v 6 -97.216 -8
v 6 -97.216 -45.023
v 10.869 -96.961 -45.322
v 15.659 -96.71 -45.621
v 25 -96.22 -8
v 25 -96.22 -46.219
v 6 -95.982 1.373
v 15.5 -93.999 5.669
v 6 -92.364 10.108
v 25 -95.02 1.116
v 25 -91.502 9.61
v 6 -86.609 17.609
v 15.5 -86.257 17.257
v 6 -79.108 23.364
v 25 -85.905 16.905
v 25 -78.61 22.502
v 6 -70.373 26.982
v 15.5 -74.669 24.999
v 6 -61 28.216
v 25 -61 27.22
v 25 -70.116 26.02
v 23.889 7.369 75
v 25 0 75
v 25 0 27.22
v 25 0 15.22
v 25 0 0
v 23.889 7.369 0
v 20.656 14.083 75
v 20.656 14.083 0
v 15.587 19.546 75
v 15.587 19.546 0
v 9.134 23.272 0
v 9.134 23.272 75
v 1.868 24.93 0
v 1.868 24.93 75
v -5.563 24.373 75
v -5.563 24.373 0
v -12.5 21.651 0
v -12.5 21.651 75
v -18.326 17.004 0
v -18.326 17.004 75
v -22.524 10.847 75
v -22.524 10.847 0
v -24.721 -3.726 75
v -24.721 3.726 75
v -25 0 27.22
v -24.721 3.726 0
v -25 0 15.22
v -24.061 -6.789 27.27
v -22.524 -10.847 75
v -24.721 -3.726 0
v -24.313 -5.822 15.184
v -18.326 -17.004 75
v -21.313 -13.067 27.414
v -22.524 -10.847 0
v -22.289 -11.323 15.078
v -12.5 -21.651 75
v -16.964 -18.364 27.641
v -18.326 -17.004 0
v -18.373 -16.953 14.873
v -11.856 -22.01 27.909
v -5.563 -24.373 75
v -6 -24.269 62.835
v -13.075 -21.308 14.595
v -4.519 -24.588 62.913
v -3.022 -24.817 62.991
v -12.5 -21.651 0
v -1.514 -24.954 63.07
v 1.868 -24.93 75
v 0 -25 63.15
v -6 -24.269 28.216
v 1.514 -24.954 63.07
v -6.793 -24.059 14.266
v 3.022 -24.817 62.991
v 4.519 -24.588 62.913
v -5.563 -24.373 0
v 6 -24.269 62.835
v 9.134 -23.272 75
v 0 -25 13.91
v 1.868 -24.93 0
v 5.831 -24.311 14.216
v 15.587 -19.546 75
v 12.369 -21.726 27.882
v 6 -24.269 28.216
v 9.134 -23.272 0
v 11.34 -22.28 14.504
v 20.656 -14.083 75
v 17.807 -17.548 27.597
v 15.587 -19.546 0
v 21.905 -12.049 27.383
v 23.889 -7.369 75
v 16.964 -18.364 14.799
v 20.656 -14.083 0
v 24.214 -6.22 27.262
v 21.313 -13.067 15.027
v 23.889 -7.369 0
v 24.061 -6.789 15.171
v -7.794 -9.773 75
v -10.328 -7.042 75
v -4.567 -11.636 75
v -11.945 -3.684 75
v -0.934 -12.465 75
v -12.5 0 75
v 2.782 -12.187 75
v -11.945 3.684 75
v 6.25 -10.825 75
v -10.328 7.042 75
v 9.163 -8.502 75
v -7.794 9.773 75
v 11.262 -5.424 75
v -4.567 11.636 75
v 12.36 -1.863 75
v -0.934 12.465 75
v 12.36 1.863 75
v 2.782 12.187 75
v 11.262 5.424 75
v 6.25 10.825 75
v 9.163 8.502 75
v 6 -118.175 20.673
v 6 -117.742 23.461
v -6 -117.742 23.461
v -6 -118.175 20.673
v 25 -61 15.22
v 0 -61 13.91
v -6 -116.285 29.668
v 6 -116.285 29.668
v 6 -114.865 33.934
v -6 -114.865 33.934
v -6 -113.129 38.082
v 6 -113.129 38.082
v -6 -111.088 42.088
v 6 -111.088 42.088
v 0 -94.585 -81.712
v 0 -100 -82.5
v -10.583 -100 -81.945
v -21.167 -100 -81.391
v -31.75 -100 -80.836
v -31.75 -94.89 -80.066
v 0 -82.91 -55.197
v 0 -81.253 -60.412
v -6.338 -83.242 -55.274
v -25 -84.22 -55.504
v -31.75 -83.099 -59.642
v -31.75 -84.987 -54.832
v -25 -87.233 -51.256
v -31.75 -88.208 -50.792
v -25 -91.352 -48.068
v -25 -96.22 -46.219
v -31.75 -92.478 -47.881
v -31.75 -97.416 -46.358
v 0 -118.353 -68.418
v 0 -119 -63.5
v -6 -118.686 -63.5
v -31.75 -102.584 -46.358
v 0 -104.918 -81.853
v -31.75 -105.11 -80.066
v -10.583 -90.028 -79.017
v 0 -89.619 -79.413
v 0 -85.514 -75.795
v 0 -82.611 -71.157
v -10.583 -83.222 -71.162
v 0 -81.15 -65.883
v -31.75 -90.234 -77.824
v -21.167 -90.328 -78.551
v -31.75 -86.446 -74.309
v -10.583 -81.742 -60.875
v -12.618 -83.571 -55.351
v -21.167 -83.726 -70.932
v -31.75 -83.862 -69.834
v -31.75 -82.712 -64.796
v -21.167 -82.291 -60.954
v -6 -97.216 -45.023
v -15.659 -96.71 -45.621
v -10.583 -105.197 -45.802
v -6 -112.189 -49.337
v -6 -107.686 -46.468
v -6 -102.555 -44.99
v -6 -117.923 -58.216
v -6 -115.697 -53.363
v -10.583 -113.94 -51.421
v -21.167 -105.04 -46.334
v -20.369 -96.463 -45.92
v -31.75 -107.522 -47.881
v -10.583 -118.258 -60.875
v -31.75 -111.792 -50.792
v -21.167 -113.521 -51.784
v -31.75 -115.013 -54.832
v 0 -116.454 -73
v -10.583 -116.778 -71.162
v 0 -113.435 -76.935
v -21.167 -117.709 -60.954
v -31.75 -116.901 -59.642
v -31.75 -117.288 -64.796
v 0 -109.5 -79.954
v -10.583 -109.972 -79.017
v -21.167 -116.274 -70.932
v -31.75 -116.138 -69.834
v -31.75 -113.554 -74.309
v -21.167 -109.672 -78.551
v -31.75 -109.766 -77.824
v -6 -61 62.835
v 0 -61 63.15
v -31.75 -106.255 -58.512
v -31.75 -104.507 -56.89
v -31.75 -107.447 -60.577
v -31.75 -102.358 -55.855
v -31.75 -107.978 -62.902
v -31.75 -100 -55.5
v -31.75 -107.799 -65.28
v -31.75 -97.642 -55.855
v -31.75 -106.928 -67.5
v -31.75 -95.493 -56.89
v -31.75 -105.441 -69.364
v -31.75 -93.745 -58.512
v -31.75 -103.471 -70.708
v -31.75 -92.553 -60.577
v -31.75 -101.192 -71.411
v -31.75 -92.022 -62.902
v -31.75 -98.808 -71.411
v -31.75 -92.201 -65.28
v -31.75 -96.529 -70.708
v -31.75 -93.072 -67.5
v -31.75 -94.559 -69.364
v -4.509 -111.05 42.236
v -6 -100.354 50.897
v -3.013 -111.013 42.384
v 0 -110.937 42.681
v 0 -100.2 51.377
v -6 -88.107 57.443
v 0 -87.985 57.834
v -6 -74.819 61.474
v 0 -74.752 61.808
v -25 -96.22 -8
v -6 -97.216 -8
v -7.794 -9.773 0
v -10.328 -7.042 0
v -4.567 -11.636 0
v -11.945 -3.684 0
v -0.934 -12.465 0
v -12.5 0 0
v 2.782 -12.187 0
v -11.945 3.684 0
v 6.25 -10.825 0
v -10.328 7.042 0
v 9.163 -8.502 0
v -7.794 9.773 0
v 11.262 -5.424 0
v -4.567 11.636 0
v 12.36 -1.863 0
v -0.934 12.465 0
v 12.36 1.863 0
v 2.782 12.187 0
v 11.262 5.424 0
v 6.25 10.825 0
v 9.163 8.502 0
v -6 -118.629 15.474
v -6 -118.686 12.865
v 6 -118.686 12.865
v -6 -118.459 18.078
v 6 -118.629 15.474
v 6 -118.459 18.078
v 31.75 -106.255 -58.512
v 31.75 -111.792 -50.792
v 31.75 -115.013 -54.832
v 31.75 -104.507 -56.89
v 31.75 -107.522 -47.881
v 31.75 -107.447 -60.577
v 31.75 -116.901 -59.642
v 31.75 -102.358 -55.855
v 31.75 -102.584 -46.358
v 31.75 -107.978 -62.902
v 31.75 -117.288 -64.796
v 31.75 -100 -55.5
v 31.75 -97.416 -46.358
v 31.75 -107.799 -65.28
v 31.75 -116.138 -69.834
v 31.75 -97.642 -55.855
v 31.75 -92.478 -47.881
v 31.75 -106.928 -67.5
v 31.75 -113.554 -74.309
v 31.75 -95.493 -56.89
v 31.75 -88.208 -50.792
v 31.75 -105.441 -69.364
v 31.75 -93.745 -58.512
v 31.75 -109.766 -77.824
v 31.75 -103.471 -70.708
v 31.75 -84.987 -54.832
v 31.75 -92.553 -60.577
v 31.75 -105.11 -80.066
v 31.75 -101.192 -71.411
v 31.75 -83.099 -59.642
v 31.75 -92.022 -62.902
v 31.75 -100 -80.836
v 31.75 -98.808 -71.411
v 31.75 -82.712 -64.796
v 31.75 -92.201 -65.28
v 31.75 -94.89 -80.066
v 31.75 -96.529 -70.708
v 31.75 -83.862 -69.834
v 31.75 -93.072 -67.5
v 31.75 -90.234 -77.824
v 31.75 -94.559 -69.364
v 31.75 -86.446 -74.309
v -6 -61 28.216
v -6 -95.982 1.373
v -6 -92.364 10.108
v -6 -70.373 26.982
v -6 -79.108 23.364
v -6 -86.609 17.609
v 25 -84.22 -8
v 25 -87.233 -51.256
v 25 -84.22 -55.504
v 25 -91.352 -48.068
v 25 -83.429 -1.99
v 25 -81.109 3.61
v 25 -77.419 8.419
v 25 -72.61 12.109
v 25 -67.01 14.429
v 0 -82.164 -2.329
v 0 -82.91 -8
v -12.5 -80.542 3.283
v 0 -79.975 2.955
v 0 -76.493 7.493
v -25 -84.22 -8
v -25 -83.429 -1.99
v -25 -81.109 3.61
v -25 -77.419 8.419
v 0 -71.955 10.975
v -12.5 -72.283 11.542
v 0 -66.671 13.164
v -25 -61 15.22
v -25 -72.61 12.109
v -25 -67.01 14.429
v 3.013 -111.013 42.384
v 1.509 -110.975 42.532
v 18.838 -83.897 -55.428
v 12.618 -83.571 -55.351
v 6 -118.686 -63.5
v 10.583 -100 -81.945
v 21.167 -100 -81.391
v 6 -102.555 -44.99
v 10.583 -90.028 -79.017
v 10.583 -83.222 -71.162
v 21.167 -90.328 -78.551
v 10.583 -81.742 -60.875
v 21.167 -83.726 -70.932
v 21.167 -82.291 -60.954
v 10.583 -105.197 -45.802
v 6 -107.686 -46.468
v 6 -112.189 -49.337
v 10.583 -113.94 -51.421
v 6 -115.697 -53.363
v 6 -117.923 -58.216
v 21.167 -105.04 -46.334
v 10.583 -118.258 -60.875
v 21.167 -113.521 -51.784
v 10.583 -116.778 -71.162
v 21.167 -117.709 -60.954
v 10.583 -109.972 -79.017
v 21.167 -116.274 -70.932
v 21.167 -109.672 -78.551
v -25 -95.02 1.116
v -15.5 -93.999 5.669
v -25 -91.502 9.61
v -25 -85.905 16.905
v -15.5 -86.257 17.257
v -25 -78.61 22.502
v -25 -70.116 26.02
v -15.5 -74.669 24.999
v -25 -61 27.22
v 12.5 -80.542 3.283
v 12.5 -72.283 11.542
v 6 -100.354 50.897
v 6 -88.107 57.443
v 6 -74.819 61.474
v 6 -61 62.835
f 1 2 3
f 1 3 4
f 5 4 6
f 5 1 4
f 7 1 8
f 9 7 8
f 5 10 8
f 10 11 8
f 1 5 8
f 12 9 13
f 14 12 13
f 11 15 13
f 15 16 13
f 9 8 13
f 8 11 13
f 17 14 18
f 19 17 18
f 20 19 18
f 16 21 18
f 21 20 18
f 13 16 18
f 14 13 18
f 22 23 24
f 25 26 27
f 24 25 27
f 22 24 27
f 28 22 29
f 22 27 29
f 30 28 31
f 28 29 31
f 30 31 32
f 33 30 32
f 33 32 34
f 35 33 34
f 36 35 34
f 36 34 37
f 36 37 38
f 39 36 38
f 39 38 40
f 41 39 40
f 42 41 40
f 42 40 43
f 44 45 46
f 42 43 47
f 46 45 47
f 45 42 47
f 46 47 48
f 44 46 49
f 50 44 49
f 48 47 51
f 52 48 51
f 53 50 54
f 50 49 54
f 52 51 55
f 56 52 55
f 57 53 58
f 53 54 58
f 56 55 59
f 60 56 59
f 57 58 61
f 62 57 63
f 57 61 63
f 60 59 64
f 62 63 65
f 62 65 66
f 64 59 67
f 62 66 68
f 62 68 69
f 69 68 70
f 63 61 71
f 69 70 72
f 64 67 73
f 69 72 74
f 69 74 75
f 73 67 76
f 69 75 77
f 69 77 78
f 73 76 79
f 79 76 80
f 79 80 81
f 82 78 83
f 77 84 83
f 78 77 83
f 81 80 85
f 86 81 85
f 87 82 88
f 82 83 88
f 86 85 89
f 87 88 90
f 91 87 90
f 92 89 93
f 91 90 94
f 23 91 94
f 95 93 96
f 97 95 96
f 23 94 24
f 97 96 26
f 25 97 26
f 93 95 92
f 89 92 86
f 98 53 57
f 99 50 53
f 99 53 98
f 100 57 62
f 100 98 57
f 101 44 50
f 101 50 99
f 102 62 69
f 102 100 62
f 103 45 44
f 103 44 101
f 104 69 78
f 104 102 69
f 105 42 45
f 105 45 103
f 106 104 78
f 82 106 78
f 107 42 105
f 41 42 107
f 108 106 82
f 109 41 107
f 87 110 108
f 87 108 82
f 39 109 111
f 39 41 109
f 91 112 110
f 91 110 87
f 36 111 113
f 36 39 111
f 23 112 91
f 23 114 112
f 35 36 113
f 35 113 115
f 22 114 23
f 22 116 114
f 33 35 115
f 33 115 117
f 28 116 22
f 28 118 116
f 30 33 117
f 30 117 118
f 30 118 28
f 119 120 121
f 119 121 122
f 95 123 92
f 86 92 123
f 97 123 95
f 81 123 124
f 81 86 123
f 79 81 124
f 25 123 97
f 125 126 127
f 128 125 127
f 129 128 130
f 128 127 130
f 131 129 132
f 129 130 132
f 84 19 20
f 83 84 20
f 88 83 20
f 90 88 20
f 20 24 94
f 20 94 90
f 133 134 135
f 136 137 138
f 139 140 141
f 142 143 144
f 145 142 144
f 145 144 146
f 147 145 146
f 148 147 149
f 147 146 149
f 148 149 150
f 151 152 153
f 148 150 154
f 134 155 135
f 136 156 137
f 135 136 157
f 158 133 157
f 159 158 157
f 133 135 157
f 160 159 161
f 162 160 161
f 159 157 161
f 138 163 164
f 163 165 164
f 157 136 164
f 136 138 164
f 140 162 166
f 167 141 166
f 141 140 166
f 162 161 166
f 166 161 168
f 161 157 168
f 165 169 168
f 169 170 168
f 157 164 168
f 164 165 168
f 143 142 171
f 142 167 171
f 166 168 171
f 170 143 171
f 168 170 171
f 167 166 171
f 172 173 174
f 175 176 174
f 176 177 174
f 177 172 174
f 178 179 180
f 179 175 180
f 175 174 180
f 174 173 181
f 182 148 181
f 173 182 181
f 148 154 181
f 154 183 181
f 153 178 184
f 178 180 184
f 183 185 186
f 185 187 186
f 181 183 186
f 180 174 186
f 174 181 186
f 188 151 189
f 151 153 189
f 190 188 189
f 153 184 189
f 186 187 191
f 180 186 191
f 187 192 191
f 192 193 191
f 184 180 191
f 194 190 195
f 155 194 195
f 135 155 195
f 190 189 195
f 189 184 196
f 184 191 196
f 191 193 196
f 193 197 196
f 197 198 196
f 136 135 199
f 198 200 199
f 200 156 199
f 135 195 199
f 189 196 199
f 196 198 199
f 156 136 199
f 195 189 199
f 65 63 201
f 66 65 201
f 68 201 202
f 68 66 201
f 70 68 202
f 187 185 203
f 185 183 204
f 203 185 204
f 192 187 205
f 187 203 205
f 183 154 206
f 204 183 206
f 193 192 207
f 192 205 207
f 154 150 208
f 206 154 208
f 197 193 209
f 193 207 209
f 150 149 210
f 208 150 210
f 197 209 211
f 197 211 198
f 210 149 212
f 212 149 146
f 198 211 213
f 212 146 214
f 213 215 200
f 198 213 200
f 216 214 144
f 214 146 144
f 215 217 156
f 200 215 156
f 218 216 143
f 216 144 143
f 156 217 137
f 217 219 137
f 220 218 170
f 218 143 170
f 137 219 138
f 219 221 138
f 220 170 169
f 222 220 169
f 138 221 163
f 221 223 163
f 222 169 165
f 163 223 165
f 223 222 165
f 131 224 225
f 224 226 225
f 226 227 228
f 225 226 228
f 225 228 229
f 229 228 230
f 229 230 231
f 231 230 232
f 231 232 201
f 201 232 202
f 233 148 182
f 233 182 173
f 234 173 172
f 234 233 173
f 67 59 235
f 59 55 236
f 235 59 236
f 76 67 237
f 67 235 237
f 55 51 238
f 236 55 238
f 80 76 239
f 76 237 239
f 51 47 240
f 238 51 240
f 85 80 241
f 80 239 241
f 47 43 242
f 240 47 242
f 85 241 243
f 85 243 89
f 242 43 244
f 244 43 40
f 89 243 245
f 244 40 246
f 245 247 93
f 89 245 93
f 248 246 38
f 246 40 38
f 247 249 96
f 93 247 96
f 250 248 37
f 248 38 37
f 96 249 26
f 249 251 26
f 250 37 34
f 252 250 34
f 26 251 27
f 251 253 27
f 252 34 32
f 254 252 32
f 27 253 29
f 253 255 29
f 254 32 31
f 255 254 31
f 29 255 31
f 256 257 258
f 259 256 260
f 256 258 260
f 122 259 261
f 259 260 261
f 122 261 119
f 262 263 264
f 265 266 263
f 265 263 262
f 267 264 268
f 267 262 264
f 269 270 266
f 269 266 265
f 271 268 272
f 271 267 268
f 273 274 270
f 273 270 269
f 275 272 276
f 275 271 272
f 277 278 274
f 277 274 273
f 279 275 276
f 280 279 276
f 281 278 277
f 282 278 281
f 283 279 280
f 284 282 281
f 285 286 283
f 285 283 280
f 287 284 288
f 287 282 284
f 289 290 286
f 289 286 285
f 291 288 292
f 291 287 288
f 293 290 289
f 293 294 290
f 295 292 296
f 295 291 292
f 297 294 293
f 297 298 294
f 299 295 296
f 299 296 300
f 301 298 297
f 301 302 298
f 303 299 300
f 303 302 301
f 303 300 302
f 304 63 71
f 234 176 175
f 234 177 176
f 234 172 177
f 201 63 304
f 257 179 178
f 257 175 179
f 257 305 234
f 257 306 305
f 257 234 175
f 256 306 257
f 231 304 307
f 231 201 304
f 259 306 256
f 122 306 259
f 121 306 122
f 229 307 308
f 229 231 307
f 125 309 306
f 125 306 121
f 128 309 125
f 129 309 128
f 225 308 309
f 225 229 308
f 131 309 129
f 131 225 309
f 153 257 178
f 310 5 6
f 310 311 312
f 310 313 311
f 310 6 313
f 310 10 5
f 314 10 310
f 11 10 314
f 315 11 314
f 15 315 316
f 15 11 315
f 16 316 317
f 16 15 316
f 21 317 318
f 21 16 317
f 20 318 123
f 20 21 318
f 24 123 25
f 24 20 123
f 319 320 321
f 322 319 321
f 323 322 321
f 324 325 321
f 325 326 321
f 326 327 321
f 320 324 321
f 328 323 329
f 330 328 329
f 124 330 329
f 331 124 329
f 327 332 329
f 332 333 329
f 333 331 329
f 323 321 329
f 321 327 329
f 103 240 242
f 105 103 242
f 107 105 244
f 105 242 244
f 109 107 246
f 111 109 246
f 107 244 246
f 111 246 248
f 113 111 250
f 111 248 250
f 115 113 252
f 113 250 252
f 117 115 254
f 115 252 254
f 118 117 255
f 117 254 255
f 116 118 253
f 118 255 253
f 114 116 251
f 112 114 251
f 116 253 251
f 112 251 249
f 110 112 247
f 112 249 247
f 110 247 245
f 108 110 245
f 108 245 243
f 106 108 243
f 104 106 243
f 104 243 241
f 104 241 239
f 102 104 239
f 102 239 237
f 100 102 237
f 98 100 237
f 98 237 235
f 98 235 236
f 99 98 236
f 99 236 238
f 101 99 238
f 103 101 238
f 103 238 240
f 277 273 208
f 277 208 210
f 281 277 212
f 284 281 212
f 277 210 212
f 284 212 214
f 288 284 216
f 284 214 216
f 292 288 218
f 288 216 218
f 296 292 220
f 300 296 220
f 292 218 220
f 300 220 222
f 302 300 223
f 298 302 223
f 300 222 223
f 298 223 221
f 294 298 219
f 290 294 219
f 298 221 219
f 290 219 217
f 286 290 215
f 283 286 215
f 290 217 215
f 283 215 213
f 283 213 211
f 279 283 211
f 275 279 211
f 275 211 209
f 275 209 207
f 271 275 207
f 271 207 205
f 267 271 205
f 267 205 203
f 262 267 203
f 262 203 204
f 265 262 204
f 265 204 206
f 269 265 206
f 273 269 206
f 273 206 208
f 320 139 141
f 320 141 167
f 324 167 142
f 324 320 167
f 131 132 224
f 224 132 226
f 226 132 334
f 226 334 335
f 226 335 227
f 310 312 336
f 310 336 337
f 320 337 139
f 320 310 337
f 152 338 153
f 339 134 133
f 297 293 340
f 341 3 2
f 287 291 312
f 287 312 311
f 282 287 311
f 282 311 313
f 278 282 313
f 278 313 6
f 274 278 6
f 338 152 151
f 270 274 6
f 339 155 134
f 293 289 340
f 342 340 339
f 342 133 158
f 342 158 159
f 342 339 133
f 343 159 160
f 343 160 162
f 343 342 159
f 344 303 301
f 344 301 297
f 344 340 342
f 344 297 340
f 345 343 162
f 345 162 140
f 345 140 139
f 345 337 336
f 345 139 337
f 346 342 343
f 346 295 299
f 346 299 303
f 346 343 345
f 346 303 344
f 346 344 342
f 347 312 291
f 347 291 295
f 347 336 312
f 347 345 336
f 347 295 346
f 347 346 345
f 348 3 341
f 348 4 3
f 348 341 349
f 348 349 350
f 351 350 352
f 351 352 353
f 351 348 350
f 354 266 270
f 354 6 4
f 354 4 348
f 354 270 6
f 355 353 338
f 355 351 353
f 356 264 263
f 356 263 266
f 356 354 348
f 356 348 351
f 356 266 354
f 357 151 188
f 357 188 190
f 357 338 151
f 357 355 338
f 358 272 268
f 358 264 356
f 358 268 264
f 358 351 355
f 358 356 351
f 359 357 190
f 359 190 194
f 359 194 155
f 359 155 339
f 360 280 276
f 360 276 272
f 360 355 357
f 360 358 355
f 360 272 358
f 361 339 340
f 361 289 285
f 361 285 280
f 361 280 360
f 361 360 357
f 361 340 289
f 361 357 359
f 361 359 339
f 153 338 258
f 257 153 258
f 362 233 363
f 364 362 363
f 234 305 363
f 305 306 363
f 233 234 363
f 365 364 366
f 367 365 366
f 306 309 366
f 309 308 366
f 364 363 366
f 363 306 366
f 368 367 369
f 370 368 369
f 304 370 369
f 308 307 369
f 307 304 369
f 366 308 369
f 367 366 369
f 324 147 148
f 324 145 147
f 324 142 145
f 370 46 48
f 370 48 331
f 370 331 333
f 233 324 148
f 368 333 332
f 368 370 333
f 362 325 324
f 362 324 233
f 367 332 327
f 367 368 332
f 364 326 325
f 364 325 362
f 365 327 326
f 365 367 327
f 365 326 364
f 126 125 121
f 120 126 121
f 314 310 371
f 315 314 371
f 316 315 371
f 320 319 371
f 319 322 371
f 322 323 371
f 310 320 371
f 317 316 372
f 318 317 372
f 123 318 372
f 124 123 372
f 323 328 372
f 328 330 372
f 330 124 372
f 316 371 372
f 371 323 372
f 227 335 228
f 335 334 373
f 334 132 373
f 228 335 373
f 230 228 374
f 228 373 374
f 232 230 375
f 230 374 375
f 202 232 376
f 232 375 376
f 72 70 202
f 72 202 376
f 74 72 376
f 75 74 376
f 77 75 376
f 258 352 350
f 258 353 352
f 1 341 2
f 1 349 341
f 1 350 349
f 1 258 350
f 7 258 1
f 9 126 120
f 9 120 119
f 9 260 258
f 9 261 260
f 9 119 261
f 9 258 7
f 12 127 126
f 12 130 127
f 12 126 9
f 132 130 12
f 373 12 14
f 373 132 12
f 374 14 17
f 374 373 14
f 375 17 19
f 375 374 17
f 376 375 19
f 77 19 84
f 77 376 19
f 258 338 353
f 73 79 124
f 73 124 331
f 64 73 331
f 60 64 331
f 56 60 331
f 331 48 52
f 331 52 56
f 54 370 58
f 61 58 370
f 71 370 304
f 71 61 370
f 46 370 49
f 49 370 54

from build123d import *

# Parameters (mm, degrees)
SKETCH1_R                     = 25
BOSS_EXTRUDE1_DEPTH           = 75
SKETCH2_R                     = 19
BOSS_EXTRUDE2_DEPTH           = 31.75
BOSS_EXTRUDE2_TAPER           = 3
BOSS_EXTRUDE2_OTHER_WAY_DEPTH = 31.75
BOSS_EXTRUDE2_OTHER_WAY_TAPER = 3
CUT_EXTRUDE2_DEPTH            = 161.296002109
CUT_EXTRUDE3_DEPTH            = 161.296002109
SKETCH14_R                    = 12.5
CUT_EXTRUDE4_DEPTH            = 149.240724994
SKETCH16_R                    = 8
CUT_EXTRUDE5_DEPTH            = 159.112302029


with BuildPart() as part:
    # Sketch1 → Boss-Extrude1 (new body)
    with BuildSketch(Plane.XY):
        Circle(SKETCH1_R)
    extrude(amount=BOSS_EXTRUDE1_DEPTH)



with BuildPart() as body_2:
    # Sketch2 → Boss-Extrude2 (new body)
    with BuildSketch(Plane(origin=(0, 0, 0), x_dir=(0, 0, -1), z_dir=(1, 0, 0))):
        with Locations((63.5, -100)):
            Circle(SKETCH2_R)
    extrude(amount=BOSS_EXTRUDE2_DEPTH, taper=BOSS_EXTRUDE2_TAPER)

    # Sketch2 → Boss-Extrude2 other way (add)
    with BuildSketch(Plane(origin=(0, 0, 0), x_dir=(0, 0, -1), z_dir=(1, 0, 0))):
        with Locations((63.5, -100)):
            Circle(SKETCH2_R)
    extrude(amount=-BOSS_EXTRUDE2_OTHER_WAY_DEPTH, taper=BOSS_EXTRUDE2_OTHER_WAY_TAPER)


with BuildPart() as part_1:
    add(part.part)

    add(body_2.part)  # Sweep2 merges body 2
    # Sweep2: sweep along a path in Sketch5
    with BuildLine(Plane(origin=(0, 0, 0), x_dir=(0, 0, -1), z_dir=(1, 0, 0))) as sweep2_path:
        Line((63.5, -81), (8, -81))
        ThreePointArc((8, -81), (-6.142135624, -75.142135624), (-12, -61))
        Line((-12, -61), (-12, 0))
    # Sketch6 → Sweep2 (sweep)
    with BuildSketch(Plane(origin=(0, 0, 0), x_dir=(1, 0, 0), z_dir=(0, 1, 0))):
        Polygon((0, -63.149520499), (-6, -62.835073823), (-6, -28.216088806), (-25, -27.220340999), (-25, -15.220340999), (0, -13.910146517), (25, -15.220340999), (25, -27.220340999), (6, -28.216088806), (6, -62.835073823), align=None)
    sweep(path=sweep2_path.line)

    # Sketch11 → Cut-Extrude2 (cut, through all)
    with BuildSketch(Plane(origin=(6, 0, 0), x_dir=(0, 0, -1), z_dir=(1, 0, 0))):
        with BuildLine():
            Line((63.5, -118.685553324), (-12.864893702, -118.685553324))
            ThreePointArc((-12.864893702, -118.685553324), (-27.962170554, -116.755099832), (-42.087961046, -111.087961046))
            ThreePointArc((-42.087961046, -111.087961046), (-19.107409182, -126.443074889), (8, -131.835073823))
            Line((8, -131.835073823), (63.5, -131.835073823))
            Line((63.5, -131.835073823), (63.5, -118.685553324))
        make_face()
    extrude(amount=-CUT_EXTRUDE2_DEPTH, mode=Mode.SUBTRACT)

    # Sketch13 → Cut-Extrude3 (cut, through all)
    with BuildSketch(Plane(origin=(6, 0, 0), x_dir=(0, 0, -1), z_dir=(1, 0, 0))):
        with BuildLine():
            Line((-45.200625265, -110.295779466), (-42.087961046, -111.087961046))
            ThreePointArc((-42.087961046, -111.087961046), (-36.02411738, -114.035804983), (-29.667824287, -116.28469849))
            Line((-29.667824287, -116.28469849), (-23.461340117, -117.742435424))
            Line((-23.461340117, -117.742435424), (44.847812883, -128.347311627))
            Line((44.847812883, -128.347311627), (71.018240587, -129.970040241))
            Line((71.018240587, -129.970040241), (72.328139591, -135.750206771))
            Line((72.328139591, -135.750206771), (-4.743995253, -135.750206771))
            Line((-4.743995253, -135.750206771), (-39.71664546, -116.755099832))
            Line((-39.71664546, -116.755099832), (-45.200625265, -110.295779466))
        make_face()
    extrude(amount=-CUT_EXTRUDE3_DEPTH, mode=Mode.SUBTRACT)

    # Sketch14 → Cut-Extrude4 (cut, through all)
    with BuildSketch(Plane(origin=(0, 0, 0), x_dir=(-1, 0, 0), z_dir=(0, 0, -1))):
        Circle(SKETCH14_R)
    extrude(amount=-CUT_EXTRUDE4_DEPTH, mode=Mode.SUBTRACT)

    # Sketch16 → Cut-Extrude5 (cut, through all)
    with BuildSketch(Plane.ZY.offset(31.75)):
        with Locations((-63.5, -100)):
            Circle(SKETCH16_R)
    extrude(amount=-CUT_EXTRUDE5_DEPTH, mode=Mode.SUBTRACT)


solid = part_1.part
